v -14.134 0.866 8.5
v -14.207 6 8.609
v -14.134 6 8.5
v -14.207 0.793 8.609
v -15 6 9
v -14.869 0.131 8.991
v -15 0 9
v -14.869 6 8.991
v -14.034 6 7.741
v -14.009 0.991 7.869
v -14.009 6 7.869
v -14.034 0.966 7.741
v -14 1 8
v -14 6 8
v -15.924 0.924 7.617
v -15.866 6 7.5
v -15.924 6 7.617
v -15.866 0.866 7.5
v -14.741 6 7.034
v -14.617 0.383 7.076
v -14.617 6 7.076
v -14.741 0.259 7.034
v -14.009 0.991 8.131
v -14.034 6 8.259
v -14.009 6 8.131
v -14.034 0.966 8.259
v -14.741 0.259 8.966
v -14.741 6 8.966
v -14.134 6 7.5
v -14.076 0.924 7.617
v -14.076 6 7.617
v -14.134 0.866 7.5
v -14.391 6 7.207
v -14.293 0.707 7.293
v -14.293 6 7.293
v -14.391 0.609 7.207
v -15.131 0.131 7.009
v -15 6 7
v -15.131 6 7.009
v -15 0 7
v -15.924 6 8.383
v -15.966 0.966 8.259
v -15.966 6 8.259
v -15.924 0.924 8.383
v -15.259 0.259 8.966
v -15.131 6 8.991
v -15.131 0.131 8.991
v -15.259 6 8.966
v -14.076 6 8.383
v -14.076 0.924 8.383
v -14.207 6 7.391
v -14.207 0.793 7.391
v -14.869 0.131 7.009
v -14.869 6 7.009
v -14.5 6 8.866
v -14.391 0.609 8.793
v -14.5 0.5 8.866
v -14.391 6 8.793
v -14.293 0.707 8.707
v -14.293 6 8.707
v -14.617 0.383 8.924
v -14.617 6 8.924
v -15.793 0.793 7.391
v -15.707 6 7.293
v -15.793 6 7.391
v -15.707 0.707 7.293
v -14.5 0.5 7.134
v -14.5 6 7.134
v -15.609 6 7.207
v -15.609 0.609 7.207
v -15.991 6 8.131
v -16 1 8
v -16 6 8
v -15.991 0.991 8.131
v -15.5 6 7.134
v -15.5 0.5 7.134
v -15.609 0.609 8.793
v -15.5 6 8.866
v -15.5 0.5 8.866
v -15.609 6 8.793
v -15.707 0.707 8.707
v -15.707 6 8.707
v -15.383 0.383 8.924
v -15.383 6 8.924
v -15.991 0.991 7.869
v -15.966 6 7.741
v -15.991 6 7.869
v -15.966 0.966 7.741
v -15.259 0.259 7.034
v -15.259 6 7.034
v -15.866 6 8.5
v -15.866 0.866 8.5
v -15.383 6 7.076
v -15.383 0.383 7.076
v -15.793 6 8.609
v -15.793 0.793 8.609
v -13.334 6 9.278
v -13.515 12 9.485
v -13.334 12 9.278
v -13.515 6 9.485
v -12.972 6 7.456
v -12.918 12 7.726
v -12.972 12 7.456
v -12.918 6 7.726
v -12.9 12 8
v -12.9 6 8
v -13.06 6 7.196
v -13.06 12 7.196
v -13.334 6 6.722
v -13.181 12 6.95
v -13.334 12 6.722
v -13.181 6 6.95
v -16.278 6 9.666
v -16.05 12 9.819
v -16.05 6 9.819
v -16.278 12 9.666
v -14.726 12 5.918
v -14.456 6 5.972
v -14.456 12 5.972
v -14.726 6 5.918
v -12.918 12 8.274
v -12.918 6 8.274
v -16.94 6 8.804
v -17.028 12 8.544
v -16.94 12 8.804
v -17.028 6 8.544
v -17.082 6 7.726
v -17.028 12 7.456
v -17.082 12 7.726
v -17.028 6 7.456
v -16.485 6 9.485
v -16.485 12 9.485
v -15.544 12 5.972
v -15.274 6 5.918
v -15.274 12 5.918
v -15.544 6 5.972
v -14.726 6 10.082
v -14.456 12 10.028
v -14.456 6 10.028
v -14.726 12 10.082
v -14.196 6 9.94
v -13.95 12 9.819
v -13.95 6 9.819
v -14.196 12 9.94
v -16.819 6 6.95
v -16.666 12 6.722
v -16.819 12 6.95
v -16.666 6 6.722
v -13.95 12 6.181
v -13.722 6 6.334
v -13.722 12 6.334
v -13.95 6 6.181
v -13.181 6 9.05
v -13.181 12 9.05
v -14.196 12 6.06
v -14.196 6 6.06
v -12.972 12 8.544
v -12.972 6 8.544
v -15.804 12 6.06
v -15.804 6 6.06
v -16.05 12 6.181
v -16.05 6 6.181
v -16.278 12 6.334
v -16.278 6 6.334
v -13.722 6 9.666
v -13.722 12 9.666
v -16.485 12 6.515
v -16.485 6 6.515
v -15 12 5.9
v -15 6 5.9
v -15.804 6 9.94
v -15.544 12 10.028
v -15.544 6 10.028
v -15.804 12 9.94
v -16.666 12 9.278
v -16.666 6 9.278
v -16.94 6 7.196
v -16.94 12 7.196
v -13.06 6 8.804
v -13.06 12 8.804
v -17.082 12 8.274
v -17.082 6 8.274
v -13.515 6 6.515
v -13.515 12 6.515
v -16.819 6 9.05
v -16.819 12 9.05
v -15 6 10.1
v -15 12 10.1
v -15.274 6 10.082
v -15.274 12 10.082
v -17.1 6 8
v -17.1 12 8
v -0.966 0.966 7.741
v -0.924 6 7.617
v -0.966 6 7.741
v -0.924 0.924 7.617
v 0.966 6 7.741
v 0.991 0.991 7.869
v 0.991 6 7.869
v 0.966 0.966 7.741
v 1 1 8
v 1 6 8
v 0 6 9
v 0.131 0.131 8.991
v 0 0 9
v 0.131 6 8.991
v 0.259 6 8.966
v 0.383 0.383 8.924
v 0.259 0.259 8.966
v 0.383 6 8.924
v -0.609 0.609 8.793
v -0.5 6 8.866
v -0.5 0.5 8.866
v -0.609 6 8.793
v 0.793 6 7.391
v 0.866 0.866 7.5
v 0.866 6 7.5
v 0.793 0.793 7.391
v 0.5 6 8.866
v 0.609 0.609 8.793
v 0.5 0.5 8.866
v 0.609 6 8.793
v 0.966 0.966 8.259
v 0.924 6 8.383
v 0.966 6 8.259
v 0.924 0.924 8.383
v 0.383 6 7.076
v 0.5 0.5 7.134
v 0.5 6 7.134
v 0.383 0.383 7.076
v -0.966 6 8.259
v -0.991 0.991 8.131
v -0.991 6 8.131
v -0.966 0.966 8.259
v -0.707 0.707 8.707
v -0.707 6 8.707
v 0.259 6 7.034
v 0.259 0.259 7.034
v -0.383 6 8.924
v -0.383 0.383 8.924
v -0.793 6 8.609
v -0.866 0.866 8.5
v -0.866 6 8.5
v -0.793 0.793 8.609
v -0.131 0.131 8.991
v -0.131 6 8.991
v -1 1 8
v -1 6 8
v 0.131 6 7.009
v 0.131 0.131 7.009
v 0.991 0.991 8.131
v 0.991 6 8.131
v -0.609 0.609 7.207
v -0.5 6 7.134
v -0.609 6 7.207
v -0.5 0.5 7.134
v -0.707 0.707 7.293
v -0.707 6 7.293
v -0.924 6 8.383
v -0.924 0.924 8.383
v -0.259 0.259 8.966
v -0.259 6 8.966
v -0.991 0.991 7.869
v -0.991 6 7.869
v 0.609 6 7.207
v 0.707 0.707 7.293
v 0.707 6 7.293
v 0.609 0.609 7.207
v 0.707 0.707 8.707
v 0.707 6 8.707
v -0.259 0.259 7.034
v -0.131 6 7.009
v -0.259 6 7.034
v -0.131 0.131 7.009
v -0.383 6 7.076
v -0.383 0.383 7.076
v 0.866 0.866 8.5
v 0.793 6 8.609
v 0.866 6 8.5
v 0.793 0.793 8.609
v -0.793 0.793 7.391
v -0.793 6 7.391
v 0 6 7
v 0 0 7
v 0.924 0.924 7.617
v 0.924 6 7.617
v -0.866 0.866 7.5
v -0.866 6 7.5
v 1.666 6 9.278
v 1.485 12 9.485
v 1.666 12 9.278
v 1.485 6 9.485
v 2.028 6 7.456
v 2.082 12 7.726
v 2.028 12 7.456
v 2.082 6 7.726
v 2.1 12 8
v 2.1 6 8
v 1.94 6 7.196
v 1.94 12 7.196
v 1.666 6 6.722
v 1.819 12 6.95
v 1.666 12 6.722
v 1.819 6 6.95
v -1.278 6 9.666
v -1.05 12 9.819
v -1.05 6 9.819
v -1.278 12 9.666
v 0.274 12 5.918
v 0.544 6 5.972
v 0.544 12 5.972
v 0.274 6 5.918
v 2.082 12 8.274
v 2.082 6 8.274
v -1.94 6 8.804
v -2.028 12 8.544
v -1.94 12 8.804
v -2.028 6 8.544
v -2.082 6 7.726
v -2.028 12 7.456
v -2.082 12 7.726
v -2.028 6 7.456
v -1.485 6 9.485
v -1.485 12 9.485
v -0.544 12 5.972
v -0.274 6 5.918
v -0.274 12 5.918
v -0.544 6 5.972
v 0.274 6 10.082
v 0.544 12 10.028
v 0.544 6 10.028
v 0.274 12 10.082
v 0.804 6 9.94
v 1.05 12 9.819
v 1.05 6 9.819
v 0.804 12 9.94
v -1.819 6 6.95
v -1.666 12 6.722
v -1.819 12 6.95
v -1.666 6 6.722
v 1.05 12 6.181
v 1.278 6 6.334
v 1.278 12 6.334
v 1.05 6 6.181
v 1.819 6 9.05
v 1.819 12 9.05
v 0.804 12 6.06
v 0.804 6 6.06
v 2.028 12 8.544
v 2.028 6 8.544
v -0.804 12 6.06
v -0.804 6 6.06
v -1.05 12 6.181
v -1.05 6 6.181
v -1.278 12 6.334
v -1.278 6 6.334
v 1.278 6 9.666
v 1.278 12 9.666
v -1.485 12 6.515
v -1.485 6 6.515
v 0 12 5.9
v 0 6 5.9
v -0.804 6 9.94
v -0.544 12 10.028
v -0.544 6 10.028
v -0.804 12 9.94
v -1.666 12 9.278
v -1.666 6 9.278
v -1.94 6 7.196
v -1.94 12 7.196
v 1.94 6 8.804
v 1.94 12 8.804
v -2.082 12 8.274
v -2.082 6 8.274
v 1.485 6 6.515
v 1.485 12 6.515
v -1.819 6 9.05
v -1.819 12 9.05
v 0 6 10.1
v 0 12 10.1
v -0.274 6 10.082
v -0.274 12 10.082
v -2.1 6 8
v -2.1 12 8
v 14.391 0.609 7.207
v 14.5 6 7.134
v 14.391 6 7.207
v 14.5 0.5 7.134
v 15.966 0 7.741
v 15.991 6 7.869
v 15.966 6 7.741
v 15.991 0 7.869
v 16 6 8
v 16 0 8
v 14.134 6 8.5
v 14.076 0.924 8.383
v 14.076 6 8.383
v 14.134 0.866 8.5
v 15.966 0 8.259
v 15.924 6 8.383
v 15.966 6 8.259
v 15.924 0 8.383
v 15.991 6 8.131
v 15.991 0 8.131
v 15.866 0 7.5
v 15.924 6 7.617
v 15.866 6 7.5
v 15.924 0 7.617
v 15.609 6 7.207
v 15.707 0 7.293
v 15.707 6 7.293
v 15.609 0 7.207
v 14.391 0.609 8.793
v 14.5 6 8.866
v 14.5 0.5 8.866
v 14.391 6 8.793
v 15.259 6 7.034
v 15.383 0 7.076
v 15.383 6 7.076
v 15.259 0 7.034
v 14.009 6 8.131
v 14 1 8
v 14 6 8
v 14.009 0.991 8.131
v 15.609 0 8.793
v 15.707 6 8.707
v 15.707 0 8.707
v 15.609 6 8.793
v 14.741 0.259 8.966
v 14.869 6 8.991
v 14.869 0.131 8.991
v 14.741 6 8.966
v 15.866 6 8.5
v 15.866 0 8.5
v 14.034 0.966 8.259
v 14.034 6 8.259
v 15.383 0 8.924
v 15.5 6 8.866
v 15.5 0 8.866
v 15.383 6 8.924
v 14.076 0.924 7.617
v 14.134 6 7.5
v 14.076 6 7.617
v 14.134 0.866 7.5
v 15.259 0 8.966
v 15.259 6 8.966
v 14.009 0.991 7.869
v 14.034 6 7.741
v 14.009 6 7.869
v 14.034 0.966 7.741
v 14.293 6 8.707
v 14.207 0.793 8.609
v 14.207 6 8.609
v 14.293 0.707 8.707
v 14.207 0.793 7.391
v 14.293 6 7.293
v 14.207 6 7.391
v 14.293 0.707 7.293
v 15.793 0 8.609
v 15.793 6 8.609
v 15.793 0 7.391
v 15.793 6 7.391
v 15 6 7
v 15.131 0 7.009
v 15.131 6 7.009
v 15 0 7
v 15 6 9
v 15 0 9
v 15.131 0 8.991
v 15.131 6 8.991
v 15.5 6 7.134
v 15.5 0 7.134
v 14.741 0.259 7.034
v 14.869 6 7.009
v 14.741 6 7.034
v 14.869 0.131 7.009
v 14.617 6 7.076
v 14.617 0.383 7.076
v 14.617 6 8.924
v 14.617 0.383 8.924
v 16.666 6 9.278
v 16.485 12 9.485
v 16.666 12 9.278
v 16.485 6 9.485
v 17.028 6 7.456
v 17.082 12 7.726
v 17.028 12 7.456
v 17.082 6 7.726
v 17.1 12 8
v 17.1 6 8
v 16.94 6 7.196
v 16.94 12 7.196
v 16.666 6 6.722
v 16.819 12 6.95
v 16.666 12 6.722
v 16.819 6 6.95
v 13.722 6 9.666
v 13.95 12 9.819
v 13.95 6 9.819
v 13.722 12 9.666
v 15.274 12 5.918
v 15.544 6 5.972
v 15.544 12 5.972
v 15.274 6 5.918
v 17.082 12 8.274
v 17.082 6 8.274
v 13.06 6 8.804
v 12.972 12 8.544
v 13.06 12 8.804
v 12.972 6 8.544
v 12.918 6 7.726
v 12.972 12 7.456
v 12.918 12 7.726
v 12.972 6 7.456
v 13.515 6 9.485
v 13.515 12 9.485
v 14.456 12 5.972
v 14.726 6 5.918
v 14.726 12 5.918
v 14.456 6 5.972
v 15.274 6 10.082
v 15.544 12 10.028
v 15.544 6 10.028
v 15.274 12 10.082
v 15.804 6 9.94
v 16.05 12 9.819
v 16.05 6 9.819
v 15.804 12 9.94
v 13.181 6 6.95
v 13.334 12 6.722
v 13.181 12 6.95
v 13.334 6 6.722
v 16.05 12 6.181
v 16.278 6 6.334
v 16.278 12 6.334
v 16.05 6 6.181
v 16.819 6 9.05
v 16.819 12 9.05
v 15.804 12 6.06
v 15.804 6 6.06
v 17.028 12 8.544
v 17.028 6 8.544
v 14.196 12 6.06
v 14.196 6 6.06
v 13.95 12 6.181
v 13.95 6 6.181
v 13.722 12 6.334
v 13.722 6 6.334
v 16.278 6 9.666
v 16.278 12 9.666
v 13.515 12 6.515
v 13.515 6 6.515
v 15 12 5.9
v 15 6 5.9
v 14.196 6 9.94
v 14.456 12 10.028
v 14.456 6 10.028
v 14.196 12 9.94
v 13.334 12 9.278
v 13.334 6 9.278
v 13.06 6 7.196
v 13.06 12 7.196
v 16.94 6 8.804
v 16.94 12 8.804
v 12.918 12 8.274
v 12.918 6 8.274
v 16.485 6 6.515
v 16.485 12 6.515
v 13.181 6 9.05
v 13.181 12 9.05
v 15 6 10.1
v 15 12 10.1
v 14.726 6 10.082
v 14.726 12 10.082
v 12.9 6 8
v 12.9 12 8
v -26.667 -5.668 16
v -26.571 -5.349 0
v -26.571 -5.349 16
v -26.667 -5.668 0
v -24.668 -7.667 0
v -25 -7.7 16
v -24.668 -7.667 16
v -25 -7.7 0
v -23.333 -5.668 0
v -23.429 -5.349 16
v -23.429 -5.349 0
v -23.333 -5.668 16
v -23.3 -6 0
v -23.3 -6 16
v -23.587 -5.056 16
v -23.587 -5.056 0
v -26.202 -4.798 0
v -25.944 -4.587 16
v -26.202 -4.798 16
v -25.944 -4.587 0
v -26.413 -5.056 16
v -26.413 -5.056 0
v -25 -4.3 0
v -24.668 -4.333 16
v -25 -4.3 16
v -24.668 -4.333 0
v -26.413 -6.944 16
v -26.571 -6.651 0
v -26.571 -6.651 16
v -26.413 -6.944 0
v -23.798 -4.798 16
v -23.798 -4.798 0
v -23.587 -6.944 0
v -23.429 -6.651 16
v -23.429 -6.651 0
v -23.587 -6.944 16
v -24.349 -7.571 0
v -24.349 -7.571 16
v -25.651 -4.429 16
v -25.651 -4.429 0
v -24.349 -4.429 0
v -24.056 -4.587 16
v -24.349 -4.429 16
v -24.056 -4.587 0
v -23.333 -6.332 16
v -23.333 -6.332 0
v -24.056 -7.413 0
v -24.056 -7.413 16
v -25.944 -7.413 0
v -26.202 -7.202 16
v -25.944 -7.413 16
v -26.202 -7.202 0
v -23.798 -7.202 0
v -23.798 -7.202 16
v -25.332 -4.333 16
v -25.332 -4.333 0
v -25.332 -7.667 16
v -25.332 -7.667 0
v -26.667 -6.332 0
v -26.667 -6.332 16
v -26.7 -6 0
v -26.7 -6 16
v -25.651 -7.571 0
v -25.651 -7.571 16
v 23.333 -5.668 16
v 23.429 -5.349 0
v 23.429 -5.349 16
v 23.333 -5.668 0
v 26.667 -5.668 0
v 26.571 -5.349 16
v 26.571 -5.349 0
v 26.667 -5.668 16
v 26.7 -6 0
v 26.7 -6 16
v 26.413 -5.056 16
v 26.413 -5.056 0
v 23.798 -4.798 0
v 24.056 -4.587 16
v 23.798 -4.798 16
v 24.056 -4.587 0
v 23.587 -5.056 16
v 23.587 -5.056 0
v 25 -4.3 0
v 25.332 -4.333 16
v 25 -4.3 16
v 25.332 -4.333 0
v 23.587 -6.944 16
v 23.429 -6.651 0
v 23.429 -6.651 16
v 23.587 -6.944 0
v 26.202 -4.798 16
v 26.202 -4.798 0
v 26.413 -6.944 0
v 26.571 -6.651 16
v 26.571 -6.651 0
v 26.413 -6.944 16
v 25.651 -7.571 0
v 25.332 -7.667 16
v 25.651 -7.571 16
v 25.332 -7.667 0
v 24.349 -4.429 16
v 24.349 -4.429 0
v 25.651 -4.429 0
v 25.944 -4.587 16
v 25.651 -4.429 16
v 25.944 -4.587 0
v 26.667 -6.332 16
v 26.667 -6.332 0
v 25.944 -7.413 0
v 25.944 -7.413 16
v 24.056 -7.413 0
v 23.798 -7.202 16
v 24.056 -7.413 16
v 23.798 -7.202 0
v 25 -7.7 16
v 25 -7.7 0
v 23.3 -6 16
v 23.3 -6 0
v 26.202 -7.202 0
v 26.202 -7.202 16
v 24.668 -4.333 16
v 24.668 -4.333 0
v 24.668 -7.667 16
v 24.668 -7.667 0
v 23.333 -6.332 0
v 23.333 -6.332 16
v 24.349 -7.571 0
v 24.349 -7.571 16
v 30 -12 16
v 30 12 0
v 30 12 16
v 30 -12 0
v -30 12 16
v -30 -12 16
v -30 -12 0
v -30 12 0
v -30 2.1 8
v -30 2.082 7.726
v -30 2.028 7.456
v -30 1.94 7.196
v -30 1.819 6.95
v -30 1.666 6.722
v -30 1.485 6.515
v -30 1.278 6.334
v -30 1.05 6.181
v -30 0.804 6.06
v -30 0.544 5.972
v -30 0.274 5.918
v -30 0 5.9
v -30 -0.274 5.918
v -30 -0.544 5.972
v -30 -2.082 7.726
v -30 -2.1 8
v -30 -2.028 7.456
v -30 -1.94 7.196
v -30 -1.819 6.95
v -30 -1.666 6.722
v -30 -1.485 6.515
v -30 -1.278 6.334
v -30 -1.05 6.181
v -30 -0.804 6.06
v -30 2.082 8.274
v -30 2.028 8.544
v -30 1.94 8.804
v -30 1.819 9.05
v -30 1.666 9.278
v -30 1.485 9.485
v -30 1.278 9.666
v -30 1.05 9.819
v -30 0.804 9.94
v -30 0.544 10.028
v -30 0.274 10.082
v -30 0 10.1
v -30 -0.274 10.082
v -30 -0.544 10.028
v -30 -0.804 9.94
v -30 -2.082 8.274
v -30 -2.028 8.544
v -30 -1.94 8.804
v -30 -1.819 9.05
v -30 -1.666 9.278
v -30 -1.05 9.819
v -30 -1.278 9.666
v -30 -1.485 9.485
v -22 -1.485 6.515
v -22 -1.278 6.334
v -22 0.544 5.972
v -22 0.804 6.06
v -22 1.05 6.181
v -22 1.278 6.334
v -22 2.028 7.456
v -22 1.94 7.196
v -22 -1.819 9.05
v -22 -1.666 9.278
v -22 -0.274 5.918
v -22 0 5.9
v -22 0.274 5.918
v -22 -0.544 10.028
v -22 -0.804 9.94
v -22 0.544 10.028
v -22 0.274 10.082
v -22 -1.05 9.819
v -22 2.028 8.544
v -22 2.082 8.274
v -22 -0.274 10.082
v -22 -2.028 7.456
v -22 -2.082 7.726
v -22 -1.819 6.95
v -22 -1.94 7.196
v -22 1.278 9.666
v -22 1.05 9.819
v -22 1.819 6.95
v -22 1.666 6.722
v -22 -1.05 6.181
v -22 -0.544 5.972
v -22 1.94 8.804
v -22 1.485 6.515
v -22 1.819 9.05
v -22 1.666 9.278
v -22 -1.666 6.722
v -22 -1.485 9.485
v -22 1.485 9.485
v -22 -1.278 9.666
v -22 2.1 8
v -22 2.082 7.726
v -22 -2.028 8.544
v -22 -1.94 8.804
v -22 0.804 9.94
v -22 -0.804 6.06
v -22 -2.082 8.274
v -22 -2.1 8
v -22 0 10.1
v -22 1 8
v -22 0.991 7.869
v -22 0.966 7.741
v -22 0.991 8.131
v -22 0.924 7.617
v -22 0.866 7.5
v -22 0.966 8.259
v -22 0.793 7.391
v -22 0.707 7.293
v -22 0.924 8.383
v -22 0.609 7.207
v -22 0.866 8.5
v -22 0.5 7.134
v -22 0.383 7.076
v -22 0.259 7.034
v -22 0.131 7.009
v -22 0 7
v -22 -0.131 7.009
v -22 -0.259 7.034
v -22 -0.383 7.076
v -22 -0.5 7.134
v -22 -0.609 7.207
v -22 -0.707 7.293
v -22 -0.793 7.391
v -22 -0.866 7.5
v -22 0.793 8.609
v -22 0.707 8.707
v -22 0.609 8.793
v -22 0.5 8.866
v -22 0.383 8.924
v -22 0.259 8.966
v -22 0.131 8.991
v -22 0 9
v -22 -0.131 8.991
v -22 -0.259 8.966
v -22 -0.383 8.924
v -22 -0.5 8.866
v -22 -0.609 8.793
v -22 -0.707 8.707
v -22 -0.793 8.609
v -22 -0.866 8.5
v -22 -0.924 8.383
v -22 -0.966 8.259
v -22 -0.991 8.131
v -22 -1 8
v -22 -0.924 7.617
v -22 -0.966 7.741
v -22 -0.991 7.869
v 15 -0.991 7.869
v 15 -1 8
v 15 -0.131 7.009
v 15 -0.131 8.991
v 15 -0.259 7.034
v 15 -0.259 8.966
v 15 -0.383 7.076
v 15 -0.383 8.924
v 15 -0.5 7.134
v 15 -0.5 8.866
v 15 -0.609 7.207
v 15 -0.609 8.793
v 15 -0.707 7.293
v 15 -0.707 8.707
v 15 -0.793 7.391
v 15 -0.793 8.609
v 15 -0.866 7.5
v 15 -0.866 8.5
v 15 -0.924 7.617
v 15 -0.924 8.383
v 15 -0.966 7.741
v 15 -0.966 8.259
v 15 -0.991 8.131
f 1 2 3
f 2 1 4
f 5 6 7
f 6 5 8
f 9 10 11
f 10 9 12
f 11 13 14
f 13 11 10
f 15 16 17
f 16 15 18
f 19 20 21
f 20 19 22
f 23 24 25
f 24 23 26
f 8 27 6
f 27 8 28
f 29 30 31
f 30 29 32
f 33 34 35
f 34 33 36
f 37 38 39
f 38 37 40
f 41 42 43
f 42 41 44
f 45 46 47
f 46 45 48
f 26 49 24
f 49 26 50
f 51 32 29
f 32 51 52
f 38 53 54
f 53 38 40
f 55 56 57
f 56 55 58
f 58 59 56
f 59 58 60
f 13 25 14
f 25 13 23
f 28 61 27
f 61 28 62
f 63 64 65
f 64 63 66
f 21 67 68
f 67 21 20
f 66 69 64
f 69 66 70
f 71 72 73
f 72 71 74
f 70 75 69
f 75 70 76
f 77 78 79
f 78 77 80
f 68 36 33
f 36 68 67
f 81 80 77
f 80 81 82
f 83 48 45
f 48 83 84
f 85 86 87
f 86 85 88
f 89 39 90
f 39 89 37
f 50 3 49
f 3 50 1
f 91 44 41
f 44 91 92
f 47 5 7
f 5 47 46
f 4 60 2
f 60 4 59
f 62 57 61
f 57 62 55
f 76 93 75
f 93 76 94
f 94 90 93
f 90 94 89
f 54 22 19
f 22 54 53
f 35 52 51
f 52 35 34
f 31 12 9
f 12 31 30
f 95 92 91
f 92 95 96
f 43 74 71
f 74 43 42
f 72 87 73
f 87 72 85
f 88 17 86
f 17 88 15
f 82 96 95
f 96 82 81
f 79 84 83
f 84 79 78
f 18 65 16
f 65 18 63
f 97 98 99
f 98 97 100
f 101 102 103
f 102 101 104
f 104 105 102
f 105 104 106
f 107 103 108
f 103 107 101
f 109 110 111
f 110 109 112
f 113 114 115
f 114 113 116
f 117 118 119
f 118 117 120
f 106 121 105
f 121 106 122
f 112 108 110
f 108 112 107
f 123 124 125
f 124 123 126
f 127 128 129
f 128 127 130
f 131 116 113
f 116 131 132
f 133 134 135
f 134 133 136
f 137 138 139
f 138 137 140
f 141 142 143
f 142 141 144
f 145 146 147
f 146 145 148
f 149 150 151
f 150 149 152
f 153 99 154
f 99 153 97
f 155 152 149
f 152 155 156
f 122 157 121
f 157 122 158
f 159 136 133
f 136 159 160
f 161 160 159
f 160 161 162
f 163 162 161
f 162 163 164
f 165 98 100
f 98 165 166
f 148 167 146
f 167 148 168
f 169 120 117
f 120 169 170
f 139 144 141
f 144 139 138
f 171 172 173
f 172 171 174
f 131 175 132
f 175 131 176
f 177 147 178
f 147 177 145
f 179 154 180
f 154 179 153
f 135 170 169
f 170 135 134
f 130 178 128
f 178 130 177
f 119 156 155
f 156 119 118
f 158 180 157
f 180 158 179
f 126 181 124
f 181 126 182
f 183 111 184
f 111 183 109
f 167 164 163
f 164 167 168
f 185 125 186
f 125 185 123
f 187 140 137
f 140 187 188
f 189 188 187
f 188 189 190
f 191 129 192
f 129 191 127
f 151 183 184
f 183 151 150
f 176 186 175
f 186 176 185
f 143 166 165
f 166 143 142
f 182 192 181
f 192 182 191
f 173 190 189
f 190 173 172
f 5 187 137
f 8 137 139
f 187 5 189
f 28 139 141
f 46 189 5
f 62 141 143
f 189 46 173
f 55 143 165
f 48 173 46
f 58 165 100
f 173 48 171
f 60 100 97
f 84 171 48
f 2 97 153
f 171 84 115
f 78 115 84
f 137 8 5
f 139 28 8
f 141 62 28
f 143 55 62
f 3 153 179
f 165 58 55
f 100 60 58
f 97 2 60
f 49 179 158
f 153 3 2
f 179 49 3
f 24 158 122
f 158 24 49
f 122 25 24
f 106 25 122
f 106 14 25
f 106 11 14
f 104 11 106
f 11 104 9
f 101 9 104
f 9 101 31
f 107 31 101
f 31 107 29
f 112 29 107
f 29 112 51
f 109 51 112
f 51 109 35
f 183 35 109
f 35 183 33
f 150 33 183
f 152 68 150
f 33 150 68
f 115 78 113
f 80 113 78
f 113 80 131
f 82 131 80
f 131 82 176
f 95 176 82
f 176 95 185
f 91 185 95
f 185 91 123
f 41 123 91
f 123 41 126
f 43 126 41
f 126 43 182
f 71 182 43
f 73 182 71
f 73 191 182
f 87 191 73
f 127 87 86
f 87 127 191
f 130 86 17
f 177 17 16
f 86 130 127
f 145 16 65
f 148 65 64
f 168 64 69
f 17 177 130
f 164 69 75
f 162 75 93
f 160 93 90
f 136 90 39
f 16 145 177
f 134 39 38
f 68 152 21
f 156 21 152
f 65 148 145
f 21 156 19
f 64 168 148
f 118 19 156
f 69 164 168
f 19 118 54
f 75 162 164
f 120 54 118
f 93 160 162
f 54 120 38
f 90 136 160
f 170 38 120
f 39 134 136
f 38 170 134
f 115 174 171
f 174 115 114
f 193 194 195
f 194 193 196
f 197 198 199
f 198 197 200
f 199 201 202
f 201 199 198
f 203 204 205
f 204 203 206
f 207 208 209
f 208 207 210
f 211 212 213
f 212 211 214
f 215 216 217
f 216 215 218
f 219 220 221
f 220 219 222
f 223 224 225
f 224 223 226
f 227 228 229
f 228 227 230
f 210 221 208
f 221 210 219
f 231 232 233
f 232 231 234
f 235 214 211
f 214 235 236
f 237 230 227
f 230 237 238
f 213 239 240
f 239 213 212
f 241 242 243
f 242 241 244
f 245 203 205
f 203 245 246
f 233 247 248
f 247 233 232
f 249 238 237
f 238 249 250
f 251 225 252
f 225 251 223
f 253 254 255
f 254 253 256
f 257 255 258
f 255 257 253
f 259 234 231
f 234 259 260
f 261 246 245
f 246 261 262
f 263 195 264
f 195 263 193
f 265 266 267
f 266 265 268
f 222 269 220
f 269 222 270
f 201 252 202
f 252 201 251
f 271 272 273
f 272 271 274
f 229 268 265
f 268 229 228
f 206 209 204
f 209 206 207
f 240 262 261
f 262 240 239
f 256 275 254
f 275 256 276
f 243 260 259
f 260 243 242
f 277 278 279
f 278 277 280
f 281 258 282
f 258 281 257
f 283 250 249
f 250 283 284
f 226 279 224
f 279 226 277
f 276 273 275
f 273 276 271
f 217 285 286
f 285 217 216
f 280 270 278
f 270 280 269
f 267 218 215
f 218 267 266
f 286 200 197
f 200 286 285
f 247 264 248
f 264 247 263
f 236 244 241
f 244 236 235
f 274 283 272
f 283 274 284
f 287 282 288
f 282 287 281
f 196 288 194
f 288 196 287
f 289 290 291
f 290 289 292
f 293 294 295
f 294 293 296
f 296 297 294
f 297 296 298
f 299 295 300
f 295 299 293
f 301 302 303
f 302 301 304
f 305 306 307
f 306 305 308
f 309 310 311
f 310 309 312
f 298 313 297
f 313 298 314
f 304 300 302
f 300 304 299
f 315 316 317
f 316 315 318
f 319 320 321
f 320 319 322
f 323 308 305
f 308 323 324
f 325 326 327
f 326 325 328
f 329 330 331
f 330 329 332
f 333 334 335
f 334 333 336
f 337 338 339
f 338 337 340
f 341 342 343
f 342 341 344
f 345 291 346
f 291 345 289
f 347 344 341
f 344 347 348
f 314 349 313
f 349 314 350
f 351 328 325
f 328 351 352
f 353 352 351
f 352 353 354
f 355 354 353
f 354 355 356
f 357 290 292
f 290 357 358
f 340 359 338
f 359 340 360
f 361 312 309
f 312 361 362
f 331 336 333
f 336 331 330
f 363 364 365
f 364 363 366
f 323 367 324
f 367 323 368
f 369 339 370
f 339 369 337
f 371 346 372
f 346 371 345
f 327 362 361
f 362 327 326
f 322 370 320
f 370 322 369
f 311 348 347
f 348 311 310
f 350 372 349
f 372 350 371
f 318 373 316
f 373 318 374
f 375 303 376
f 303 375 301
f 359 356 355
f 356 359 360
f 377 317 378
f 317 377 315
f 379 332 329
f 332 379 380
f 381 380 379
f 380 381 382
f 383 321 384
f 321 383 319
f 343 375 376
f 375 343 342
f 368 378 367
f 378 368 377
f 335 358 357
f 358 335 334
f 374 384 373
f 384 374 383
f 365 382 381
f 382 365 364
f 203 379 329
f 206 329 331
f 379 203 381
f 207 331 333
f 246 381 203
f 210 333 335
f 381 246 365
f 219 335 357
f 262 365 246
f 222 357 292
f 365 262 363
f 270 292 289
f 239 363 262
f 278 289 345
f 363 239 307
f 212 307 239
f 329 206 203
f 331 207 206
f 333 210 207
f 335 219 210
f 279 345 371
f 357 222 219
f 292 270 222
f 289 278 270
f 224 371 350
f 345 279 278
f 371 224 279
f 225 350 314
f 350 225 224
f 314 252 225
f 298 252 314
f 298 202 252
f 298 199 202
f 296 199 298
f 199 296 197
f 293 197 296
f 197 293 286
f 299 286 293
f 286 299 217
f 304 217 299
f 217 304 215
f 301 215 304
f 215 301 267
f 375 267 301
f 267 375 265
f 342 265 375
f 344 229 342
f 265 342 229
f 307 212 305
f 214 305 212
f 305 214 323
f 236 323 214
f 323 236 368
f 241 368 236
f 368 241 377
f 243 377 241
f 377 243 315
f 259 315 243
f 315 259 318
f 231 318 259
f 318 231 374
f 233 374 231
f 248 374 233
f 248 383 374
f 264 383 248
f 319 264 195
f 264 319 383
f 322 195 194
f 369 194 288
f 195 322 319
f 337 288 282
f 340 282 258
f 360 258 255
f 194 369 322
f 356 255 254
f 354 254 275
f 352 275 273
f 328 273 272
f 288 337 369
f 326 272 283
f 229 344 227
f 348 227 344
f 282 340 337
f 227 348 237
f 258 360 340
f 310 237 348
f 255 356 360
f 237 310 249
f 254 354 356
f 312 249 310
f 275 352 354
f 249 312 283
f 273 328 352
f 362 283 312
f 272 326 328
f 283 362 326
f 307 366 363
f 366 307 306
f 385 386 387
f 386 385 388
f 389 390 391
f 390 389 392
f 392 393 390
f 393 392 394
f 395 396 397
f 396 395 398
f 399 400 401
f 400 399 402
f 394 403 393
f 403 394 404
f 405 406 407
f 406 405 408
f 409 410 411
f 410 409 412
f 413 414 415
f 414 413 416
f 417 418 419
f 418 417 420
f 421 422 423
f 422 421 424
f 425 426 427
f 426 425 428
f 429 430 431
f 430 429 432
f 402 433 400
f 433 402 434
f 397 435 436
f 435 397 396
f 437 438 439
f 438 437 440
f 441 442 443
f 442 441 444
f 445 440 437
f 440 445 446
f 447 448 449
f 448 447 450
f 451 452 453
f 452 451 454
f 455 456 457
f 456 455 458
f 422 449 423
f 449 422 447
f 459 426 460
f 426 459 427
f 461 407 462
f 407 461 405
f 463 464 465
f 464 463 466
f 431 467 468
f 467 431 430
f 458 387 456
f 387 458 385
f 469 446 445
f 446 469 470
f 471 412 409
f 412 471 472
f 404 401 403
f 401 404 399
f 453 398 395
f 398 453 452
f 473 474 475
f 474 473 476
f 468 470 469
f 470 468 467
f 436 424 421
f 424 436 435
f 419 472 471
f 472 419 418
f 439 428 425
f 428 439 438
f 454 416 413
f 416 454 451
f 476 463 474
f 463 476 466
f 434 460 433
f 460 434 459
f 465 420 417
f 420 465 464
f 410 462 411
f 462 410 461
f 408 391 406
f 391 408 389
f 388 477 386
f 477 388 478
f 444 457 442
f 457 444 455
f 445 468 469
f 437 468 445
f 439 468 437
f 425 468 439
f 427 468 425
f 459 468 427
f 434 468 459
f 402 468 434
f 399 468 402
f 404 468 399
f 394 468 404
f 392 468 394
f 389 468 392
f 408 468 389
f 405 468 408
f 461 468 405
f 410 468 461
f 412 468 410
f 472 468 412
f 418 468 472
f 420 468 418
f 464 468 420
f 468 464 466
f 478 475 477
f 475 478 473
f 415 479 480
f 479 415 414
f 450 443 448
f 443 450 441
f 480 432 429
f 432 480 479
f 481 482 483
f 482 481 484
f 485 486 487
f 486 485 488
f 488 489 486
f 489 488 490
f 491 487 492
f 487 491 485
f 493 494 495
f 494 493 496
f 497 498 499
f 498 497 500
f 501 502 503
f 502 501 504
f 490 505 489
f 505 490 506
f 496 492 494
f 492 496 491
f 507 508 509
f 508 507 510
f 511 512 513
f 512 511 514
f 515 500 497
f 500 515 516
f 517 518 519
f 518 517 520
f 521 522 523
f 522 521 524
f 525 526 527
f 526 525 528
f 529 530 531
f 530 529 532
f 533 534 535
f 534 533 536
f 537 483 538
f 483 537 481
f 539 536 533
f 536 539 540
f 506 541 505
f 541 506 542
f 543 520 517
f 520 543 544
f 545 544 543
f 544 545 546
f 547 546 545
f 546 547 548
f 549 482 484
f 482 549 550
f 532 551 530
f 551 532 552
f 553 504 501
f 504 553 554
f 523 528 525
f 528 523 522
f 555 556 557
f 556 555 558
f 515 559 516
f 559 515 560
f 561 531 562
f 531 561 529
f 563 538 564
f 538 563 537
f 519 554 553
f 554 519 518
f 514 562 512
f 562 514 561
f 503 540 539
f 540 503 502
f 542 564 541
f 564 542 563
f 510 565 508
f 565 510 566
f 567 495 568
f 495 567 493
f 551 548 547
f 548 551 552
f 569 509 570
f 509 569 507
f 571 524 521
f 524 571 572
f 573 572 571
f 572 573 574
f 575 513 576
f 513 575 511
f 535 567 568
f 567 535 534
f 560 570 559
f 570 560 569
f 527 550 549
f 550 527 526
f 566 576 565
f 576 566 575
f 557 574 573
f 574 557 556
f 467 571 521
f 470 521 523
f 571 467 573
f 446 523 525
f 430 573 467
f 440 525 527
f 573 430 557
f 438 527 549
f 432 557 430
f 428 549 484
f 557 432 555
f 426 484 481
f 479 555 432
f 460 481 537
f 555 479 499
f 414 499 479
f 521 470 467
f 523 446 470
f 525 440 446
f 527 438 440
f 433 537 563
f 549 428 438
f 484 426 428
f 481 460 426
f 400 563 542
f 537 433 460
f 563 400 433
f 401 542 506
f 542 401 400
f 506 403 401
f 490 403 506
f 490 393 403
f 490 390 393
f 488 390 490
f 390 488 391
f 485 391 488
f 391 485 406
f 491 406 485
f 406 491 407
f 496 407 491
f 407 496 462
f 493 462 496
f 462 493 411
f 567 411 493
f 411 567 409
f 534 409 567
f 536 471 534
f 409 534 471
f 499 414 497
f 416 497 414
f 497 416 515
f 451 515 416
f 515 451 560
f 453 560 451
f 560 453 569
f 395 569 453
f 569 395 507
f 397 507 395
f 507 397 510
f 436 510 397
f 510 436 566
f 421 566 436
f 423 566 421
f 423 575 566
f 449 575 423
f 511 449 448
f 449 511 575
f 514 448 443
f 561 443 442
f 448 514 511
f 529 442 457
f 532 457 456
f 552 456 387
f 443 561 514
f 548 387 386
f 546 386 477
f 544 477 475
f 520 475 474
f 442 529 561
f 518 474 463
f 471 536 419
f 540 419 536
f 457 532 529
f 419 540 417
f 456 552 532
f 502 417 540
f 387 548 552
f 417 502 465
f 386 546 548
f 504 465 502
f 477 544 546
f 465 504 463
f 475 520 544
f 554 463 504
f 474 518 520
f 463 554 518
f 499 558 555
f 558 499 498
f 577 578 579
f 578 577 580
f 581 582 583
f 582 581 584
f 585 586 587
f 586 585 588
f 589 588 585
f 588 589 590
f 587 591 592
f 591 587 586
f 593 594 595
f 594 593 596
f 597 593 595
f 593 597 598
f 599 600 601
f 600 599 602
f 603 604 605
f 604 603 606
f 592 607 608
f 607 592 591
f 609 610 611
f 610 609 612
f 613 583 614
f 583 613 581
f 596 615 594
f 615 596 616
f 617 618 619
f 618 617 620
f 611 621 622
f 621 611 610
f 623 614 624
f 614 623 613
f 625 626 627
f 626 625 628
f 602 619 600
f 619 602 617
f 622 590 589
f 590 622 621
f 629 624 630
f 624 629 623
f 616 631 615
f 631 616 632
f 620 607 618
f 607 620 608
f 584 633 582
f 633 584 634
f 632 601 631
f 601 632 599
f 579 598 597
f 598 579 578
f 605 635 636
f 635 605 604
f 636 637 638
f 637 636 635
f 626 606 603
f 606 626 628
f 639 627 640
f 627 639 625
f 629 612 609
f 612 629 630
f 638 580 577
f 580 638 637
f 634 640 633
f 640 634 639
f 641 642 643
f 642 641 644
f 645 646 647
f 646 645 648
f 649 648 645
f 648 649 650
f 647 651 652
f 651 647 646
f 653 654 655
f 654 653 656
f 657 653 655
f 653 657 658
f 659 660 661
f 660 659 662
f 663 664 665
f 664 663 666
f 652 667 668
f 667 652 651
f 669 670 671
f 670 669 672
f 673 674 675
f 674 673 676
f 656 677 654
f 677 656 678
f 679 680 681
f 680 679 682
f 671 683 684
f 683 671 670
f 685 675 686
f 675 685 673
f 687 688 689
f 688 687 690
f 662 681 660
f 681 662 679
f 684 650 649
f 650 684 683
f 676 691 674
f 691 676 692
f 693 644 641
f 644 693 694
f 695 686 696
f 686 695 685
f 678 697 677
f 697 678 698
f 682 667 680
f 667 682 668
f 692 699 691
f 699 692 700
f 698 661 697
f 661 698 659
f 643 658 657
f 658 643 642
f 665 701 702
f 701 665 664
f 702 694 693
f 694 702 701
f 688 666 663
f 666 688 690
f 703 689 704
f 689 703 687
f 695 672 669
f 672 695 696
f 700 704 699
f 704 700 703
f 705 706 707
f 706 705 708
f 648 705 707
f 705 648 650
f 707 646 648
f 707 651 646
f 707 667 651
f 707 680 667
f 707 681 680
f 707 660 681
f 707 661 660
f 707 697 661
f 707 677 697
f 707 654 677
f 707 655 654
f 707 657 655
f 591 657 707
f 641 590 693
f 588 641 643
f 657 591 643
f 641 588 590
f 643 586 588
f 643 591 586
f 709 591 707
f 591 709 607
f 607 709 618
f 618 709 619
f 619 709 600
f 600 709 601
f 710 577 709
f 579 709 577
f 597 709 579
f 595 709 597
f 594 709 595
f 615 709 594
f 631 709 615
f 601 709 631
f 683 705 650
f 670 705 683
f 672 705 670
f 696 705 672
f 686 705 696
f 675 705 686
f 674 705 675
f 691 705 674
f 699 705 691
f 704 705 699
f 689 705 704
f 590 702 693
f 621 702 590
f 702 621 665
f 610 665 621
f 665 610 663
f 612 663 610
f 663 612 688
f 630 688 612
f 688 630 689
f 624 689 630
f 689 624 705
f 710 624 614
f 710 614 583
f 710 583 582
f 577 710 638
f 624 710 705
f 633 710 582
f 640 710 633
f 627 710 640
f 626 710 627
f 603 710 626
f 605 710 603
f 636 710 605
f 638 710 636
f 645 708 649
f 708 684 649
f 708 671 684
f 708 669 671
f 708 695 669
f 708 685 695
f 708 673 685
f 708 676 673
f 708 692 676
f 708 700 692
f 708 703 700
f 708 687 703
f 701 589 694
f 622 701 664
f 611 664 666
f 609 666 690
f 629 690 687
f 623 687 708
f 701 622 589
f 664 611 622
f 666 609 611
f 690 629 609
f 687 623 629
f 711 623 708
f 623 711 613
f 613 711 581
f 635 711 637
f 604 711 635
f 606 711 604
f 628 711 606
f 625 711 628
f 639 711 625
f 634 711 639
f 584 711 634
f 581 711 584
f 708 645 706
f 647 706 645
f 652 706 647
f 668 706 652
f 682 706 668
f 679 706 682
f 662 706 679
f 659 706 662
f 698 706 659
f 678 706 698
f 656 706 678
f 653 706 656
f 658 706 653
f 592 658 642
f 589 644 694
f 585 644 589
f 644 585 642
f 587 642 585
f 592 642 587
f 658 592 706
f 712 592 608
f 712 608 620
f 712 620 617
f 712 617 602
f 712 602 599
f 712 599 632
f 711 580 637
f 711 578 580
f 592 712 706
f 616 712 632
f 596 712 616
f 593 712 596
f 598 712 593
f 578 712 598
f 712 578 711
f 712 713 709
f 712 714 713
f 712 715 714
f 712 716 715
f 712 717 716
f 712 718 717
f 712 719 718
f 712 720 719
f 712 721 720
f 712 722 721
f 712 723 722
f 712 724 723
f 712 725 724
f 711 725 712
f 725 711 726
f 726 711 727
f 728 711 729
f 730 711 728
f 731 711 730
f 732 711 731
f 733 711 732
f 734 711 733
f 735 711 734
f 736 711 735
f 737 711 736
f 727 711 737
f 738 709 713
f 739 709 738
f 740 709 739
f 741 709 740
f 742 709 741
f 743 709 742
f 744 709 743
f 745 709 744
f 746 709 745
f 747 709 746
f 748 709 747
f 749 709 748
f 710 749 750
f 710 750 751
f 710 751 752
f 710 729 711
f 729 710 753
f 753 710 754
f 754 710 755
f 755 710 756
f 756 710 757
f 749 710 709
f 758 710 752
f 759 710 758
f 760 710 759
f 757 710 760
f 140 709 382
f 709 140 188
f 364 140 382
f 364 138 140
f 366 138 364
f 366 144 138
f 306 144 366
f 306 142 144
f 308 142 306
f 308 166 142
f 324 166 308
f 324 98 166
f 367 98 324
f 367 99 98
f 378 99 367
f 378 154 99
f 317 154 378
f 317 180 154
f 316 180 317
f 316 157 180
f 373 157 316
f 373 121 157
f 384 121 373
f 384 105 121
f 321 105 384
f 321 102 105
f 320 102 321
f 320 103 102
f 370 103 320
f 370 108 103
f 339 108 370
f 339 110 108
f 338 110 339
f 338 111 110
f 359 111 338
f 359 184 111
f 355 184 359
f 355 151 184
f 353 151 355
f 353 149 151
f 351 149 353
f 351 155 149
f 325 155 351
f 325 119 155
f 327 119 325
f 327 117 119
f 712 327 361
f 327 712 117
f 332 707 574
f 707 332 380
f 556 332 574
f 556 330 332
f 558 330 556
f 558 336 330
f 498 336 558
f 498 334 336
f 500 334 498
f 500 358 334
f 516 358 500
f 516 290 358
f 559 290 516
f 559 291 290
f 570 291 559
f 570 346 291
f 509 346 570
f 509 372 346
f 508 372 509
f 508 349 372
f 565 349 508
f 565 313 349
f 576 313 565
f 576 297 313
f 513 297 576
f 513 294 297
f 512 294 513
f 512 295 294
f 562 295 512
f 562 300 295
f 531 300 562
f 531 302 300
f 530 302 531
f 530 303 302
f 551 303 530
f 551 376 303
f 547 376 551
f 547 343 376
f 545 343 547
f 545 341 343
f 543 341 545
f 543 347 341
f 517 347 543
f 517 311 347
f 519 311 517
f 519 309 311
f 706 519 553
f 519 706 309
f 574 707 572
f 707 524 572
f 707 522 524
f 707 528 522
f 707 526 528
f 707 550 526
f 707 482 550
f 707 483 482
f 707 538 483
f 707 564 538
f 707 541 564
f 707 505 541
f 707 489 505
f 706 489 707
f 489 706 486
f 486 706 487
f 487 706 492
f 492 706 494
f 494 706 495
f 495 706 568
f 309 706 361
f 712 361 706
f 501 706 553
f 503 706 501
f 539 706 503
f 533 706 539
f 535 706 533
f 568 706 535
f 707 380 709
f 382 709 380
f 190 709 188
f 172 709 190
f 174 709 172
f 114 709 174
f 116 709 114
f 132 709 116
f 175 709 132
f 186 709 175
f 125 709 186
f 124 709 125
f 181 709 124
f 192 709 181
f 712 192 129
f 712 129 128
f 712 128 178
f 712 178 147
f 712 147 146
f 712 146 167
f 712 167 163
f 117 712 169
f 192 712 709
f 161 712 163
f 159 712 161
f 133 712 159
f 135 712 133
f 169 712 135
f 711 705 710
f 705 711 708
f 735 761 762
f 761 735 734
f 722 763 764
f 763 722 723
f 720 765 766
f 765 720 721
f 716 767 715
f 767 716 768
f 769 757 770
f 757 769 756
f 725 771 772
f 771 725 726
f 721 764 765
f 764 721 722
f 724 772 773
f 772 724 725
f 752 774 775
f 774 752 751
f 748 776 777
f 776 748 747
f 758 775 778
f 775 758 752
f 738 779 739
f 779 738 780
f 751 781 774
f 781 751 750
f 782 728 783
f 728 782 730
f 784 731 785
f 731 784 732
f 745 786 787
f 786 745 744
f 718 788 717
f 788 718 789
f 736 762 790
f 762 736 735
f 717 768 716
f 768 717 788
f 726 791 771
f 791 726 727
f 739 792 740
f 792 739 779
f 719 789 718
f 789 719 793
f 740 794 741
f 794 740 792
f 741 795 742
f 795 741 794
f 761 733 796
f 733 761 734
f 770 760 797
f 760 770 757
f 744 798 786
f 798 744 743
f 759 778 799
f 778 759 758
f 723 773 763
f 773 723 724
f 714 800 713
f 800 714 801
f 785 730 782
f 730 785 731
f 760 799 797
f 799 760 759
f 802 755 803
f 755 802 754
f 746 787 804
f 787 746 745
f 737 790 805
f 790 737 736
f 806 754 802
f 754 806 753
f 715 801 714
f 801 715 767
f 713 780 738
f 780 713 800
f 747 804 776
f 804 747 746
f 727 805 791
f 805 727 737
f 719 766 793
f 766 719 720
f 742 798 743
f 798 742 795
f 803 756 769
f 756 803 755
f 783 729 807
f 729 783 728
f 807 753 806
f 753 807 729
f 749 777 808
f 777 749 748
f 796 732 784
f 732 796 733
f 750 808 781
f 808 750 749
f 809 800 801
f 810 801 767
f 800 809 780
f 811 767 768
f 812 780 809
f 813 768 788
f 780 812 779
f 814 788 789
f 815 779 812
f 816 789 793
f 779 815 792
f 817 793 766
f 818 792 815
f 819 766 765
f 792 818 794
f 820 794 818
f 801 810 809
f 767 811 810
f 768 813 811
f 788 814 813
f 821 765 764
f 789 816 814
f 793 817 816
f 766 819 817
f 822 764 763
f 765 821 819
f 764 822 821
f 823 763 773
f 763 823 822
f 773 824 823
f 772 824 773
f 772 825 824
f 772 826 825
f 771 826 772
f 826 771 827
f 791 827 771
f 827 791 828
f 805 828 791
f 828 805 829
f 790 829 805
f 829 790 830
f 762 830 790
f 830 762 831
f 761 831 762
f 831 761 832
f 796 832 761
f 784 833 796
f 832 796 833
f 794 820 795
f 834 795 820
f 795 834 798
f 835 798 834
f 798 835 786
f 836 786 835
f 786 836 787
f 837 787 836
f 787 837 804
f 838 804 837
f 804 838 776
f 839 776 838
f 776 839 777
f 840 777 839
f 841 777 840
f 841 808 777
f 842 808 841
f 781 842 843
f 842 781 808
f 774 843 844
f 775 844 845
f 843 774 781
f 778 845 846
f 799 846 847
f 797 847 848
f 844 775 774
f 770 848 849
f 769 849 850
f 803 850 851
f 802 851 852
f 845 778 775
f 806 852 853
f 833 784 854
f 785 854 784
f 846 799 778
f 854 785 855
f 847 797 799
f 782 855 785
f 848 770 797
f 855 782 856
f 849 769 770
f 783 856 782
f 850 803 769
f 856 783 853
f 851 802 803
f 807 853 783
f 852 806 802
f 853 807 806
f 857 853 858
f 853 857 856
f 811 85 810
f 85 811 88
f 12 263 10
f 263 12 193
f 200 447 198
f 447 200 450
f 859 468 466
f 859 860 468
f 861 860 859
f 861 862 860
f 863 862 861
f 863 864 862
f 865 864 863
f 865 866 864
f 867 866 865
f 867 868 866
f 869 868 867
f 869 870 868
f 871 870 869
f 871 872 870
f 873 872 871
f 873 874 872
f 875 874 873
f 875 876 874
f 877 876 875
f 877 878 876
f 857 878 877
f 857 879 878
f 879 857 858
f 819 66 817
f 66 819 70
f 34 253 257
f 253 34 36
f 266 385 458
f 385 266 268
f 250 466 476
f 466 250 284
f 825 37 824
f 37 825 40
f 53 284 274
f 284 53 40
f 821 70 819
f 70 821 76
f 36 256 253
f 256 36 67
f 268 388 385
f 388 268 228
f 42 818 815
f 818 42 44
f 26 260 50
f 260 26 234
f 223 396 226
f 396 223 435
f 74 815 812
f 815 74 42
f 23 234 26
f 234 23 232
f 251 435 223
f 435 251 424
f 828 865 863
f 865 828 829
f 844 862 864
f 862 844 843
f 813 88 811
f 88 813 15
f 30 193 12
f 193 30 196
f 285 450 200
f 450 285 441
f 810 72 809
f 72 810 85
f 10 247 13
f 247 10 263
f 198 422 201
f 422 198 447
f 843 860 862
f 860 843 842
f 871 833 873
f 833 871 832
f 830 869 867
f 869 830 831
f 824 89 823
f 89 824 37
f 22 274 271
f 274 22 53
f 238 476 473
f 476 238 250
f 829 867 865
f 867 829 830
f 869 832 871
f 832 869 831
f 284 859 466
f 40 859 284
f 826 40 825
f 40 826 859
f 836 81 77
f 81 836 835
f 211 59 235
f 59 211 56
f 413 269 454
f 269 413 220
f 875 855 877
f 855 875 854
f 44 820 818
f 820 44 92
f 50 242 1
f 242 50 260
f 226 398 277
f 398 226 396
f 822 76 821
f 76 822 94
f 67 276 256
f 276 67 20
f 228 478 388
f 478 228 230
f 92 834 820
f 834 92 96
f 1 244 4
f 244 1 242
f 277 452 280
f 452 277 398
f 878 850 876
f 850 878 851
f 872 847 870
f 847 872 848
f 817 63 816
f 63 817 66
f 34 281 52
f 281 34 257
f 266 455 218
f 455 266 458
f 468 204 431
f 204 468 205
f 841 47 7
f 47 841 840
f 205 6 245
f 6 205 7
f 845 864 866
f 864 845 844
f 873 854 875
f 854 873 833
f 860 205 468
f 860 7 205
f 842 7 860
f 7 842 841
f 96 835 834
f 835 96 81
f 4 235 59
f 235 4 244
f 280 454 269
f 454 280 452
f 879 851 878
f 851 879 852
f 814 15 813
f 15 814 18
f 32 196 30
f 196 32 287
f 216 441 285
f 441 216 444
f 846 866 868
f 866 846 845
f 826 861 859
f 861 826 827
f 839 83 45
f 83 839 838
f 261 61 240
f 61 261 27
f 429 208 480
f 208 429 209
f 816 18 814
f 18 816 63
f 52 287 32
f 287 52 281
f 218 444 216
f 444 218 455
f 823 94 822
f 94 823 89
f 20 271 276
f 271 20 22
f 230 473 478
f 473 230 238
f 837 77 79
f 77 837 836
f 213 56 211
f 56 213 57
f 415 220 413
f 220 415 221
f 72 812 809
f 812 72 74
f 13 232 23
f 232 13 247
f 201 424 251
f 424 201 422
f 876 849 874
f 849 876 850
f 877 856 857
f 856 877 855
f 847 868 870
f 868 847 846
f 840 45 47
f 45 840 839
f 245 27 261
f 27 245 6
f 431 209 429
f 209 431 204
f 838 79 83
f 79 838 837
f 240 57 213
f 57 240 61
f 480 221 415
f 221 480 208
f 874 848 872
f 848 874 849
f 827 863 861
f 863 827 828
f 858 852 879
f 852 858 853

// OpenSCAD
// KNOWN-WRONG PART (must fail): the channels are 2 mm instead of 3
// Manifold block: one tubing inlet split into three outlets through internal channels
// Category: hardware. 3 mm channels in the mid-plane: an inlet socket on the -X face feeds a main
// channel that ends inside the block; three branches run to sockets on the +Y face.
// Print: PETG, lying on its bottom face, 0.15 mm layers, 100 % infill (watertight walls);
// the 3 mm channels bridge cleanly. Leak-test before use; glue the tubing into the sockets.
// SPDX-License-Identifier: CERN-OHL-P-2.0

/* [Manifold] */
block = [60, 24, 16];     // X, Y, Z [mm], centred in X and Y
ch_z = 8;                 // channel mid-plane
ch_d = 2;
sock_d = 4.2;             // socket for 4 mm OD tubing
inlet_sock = 8;           // inlet socket depth (from the -X face)
outlet_sock = 6;          // outlet socket depth (from the +Y face)
main_end = 15;            // the main channel stops at x = 15
outlets_x = [-15, 0, 15];
screw_d = 3.4;            // M3 clearance
screws = [[-25, -6], [25, -6]];

/* [Hidden] */
eps = 0.01;

difference() {
    translate([-block.x / 2, -block.y / 2, 0]) cube(block);
    // inlet socket and main channel along +X
    translate([-block.x / 2 - 1, 0, ch_z]) rotate([0, 90, 0]) cylinder(d = sock_d, h = inlet_sock + 1, $fn = 48);
    translate([-block.x / 2 - 1, 0, ch_z]) rotate([0, 90, 0]) cylinder(d = ch_d, h = block.x / 2 + main_end + 1, $fn = 48);
    // outlet branches along +Y, each ending in a socket
    for (x = outlets_x) {
        translate([x, 0, ch_z]) rotate([-90, 0, 0]) cylinder(d = ch_d, h = block.y / 2 + 1, $fn = 48);
        translate([x, block.y / 2 - outlet_sock, ch_z]) rotate([-90, 0, 0]) cylinder(d = sock_d, h = outlet_sock + 1, $fn = 48);
    }
    for (p = screws) translate([p.x, p.y, -1]) cylinder(d = screw_d, h = block.z + 2, $fn = 32);
}
